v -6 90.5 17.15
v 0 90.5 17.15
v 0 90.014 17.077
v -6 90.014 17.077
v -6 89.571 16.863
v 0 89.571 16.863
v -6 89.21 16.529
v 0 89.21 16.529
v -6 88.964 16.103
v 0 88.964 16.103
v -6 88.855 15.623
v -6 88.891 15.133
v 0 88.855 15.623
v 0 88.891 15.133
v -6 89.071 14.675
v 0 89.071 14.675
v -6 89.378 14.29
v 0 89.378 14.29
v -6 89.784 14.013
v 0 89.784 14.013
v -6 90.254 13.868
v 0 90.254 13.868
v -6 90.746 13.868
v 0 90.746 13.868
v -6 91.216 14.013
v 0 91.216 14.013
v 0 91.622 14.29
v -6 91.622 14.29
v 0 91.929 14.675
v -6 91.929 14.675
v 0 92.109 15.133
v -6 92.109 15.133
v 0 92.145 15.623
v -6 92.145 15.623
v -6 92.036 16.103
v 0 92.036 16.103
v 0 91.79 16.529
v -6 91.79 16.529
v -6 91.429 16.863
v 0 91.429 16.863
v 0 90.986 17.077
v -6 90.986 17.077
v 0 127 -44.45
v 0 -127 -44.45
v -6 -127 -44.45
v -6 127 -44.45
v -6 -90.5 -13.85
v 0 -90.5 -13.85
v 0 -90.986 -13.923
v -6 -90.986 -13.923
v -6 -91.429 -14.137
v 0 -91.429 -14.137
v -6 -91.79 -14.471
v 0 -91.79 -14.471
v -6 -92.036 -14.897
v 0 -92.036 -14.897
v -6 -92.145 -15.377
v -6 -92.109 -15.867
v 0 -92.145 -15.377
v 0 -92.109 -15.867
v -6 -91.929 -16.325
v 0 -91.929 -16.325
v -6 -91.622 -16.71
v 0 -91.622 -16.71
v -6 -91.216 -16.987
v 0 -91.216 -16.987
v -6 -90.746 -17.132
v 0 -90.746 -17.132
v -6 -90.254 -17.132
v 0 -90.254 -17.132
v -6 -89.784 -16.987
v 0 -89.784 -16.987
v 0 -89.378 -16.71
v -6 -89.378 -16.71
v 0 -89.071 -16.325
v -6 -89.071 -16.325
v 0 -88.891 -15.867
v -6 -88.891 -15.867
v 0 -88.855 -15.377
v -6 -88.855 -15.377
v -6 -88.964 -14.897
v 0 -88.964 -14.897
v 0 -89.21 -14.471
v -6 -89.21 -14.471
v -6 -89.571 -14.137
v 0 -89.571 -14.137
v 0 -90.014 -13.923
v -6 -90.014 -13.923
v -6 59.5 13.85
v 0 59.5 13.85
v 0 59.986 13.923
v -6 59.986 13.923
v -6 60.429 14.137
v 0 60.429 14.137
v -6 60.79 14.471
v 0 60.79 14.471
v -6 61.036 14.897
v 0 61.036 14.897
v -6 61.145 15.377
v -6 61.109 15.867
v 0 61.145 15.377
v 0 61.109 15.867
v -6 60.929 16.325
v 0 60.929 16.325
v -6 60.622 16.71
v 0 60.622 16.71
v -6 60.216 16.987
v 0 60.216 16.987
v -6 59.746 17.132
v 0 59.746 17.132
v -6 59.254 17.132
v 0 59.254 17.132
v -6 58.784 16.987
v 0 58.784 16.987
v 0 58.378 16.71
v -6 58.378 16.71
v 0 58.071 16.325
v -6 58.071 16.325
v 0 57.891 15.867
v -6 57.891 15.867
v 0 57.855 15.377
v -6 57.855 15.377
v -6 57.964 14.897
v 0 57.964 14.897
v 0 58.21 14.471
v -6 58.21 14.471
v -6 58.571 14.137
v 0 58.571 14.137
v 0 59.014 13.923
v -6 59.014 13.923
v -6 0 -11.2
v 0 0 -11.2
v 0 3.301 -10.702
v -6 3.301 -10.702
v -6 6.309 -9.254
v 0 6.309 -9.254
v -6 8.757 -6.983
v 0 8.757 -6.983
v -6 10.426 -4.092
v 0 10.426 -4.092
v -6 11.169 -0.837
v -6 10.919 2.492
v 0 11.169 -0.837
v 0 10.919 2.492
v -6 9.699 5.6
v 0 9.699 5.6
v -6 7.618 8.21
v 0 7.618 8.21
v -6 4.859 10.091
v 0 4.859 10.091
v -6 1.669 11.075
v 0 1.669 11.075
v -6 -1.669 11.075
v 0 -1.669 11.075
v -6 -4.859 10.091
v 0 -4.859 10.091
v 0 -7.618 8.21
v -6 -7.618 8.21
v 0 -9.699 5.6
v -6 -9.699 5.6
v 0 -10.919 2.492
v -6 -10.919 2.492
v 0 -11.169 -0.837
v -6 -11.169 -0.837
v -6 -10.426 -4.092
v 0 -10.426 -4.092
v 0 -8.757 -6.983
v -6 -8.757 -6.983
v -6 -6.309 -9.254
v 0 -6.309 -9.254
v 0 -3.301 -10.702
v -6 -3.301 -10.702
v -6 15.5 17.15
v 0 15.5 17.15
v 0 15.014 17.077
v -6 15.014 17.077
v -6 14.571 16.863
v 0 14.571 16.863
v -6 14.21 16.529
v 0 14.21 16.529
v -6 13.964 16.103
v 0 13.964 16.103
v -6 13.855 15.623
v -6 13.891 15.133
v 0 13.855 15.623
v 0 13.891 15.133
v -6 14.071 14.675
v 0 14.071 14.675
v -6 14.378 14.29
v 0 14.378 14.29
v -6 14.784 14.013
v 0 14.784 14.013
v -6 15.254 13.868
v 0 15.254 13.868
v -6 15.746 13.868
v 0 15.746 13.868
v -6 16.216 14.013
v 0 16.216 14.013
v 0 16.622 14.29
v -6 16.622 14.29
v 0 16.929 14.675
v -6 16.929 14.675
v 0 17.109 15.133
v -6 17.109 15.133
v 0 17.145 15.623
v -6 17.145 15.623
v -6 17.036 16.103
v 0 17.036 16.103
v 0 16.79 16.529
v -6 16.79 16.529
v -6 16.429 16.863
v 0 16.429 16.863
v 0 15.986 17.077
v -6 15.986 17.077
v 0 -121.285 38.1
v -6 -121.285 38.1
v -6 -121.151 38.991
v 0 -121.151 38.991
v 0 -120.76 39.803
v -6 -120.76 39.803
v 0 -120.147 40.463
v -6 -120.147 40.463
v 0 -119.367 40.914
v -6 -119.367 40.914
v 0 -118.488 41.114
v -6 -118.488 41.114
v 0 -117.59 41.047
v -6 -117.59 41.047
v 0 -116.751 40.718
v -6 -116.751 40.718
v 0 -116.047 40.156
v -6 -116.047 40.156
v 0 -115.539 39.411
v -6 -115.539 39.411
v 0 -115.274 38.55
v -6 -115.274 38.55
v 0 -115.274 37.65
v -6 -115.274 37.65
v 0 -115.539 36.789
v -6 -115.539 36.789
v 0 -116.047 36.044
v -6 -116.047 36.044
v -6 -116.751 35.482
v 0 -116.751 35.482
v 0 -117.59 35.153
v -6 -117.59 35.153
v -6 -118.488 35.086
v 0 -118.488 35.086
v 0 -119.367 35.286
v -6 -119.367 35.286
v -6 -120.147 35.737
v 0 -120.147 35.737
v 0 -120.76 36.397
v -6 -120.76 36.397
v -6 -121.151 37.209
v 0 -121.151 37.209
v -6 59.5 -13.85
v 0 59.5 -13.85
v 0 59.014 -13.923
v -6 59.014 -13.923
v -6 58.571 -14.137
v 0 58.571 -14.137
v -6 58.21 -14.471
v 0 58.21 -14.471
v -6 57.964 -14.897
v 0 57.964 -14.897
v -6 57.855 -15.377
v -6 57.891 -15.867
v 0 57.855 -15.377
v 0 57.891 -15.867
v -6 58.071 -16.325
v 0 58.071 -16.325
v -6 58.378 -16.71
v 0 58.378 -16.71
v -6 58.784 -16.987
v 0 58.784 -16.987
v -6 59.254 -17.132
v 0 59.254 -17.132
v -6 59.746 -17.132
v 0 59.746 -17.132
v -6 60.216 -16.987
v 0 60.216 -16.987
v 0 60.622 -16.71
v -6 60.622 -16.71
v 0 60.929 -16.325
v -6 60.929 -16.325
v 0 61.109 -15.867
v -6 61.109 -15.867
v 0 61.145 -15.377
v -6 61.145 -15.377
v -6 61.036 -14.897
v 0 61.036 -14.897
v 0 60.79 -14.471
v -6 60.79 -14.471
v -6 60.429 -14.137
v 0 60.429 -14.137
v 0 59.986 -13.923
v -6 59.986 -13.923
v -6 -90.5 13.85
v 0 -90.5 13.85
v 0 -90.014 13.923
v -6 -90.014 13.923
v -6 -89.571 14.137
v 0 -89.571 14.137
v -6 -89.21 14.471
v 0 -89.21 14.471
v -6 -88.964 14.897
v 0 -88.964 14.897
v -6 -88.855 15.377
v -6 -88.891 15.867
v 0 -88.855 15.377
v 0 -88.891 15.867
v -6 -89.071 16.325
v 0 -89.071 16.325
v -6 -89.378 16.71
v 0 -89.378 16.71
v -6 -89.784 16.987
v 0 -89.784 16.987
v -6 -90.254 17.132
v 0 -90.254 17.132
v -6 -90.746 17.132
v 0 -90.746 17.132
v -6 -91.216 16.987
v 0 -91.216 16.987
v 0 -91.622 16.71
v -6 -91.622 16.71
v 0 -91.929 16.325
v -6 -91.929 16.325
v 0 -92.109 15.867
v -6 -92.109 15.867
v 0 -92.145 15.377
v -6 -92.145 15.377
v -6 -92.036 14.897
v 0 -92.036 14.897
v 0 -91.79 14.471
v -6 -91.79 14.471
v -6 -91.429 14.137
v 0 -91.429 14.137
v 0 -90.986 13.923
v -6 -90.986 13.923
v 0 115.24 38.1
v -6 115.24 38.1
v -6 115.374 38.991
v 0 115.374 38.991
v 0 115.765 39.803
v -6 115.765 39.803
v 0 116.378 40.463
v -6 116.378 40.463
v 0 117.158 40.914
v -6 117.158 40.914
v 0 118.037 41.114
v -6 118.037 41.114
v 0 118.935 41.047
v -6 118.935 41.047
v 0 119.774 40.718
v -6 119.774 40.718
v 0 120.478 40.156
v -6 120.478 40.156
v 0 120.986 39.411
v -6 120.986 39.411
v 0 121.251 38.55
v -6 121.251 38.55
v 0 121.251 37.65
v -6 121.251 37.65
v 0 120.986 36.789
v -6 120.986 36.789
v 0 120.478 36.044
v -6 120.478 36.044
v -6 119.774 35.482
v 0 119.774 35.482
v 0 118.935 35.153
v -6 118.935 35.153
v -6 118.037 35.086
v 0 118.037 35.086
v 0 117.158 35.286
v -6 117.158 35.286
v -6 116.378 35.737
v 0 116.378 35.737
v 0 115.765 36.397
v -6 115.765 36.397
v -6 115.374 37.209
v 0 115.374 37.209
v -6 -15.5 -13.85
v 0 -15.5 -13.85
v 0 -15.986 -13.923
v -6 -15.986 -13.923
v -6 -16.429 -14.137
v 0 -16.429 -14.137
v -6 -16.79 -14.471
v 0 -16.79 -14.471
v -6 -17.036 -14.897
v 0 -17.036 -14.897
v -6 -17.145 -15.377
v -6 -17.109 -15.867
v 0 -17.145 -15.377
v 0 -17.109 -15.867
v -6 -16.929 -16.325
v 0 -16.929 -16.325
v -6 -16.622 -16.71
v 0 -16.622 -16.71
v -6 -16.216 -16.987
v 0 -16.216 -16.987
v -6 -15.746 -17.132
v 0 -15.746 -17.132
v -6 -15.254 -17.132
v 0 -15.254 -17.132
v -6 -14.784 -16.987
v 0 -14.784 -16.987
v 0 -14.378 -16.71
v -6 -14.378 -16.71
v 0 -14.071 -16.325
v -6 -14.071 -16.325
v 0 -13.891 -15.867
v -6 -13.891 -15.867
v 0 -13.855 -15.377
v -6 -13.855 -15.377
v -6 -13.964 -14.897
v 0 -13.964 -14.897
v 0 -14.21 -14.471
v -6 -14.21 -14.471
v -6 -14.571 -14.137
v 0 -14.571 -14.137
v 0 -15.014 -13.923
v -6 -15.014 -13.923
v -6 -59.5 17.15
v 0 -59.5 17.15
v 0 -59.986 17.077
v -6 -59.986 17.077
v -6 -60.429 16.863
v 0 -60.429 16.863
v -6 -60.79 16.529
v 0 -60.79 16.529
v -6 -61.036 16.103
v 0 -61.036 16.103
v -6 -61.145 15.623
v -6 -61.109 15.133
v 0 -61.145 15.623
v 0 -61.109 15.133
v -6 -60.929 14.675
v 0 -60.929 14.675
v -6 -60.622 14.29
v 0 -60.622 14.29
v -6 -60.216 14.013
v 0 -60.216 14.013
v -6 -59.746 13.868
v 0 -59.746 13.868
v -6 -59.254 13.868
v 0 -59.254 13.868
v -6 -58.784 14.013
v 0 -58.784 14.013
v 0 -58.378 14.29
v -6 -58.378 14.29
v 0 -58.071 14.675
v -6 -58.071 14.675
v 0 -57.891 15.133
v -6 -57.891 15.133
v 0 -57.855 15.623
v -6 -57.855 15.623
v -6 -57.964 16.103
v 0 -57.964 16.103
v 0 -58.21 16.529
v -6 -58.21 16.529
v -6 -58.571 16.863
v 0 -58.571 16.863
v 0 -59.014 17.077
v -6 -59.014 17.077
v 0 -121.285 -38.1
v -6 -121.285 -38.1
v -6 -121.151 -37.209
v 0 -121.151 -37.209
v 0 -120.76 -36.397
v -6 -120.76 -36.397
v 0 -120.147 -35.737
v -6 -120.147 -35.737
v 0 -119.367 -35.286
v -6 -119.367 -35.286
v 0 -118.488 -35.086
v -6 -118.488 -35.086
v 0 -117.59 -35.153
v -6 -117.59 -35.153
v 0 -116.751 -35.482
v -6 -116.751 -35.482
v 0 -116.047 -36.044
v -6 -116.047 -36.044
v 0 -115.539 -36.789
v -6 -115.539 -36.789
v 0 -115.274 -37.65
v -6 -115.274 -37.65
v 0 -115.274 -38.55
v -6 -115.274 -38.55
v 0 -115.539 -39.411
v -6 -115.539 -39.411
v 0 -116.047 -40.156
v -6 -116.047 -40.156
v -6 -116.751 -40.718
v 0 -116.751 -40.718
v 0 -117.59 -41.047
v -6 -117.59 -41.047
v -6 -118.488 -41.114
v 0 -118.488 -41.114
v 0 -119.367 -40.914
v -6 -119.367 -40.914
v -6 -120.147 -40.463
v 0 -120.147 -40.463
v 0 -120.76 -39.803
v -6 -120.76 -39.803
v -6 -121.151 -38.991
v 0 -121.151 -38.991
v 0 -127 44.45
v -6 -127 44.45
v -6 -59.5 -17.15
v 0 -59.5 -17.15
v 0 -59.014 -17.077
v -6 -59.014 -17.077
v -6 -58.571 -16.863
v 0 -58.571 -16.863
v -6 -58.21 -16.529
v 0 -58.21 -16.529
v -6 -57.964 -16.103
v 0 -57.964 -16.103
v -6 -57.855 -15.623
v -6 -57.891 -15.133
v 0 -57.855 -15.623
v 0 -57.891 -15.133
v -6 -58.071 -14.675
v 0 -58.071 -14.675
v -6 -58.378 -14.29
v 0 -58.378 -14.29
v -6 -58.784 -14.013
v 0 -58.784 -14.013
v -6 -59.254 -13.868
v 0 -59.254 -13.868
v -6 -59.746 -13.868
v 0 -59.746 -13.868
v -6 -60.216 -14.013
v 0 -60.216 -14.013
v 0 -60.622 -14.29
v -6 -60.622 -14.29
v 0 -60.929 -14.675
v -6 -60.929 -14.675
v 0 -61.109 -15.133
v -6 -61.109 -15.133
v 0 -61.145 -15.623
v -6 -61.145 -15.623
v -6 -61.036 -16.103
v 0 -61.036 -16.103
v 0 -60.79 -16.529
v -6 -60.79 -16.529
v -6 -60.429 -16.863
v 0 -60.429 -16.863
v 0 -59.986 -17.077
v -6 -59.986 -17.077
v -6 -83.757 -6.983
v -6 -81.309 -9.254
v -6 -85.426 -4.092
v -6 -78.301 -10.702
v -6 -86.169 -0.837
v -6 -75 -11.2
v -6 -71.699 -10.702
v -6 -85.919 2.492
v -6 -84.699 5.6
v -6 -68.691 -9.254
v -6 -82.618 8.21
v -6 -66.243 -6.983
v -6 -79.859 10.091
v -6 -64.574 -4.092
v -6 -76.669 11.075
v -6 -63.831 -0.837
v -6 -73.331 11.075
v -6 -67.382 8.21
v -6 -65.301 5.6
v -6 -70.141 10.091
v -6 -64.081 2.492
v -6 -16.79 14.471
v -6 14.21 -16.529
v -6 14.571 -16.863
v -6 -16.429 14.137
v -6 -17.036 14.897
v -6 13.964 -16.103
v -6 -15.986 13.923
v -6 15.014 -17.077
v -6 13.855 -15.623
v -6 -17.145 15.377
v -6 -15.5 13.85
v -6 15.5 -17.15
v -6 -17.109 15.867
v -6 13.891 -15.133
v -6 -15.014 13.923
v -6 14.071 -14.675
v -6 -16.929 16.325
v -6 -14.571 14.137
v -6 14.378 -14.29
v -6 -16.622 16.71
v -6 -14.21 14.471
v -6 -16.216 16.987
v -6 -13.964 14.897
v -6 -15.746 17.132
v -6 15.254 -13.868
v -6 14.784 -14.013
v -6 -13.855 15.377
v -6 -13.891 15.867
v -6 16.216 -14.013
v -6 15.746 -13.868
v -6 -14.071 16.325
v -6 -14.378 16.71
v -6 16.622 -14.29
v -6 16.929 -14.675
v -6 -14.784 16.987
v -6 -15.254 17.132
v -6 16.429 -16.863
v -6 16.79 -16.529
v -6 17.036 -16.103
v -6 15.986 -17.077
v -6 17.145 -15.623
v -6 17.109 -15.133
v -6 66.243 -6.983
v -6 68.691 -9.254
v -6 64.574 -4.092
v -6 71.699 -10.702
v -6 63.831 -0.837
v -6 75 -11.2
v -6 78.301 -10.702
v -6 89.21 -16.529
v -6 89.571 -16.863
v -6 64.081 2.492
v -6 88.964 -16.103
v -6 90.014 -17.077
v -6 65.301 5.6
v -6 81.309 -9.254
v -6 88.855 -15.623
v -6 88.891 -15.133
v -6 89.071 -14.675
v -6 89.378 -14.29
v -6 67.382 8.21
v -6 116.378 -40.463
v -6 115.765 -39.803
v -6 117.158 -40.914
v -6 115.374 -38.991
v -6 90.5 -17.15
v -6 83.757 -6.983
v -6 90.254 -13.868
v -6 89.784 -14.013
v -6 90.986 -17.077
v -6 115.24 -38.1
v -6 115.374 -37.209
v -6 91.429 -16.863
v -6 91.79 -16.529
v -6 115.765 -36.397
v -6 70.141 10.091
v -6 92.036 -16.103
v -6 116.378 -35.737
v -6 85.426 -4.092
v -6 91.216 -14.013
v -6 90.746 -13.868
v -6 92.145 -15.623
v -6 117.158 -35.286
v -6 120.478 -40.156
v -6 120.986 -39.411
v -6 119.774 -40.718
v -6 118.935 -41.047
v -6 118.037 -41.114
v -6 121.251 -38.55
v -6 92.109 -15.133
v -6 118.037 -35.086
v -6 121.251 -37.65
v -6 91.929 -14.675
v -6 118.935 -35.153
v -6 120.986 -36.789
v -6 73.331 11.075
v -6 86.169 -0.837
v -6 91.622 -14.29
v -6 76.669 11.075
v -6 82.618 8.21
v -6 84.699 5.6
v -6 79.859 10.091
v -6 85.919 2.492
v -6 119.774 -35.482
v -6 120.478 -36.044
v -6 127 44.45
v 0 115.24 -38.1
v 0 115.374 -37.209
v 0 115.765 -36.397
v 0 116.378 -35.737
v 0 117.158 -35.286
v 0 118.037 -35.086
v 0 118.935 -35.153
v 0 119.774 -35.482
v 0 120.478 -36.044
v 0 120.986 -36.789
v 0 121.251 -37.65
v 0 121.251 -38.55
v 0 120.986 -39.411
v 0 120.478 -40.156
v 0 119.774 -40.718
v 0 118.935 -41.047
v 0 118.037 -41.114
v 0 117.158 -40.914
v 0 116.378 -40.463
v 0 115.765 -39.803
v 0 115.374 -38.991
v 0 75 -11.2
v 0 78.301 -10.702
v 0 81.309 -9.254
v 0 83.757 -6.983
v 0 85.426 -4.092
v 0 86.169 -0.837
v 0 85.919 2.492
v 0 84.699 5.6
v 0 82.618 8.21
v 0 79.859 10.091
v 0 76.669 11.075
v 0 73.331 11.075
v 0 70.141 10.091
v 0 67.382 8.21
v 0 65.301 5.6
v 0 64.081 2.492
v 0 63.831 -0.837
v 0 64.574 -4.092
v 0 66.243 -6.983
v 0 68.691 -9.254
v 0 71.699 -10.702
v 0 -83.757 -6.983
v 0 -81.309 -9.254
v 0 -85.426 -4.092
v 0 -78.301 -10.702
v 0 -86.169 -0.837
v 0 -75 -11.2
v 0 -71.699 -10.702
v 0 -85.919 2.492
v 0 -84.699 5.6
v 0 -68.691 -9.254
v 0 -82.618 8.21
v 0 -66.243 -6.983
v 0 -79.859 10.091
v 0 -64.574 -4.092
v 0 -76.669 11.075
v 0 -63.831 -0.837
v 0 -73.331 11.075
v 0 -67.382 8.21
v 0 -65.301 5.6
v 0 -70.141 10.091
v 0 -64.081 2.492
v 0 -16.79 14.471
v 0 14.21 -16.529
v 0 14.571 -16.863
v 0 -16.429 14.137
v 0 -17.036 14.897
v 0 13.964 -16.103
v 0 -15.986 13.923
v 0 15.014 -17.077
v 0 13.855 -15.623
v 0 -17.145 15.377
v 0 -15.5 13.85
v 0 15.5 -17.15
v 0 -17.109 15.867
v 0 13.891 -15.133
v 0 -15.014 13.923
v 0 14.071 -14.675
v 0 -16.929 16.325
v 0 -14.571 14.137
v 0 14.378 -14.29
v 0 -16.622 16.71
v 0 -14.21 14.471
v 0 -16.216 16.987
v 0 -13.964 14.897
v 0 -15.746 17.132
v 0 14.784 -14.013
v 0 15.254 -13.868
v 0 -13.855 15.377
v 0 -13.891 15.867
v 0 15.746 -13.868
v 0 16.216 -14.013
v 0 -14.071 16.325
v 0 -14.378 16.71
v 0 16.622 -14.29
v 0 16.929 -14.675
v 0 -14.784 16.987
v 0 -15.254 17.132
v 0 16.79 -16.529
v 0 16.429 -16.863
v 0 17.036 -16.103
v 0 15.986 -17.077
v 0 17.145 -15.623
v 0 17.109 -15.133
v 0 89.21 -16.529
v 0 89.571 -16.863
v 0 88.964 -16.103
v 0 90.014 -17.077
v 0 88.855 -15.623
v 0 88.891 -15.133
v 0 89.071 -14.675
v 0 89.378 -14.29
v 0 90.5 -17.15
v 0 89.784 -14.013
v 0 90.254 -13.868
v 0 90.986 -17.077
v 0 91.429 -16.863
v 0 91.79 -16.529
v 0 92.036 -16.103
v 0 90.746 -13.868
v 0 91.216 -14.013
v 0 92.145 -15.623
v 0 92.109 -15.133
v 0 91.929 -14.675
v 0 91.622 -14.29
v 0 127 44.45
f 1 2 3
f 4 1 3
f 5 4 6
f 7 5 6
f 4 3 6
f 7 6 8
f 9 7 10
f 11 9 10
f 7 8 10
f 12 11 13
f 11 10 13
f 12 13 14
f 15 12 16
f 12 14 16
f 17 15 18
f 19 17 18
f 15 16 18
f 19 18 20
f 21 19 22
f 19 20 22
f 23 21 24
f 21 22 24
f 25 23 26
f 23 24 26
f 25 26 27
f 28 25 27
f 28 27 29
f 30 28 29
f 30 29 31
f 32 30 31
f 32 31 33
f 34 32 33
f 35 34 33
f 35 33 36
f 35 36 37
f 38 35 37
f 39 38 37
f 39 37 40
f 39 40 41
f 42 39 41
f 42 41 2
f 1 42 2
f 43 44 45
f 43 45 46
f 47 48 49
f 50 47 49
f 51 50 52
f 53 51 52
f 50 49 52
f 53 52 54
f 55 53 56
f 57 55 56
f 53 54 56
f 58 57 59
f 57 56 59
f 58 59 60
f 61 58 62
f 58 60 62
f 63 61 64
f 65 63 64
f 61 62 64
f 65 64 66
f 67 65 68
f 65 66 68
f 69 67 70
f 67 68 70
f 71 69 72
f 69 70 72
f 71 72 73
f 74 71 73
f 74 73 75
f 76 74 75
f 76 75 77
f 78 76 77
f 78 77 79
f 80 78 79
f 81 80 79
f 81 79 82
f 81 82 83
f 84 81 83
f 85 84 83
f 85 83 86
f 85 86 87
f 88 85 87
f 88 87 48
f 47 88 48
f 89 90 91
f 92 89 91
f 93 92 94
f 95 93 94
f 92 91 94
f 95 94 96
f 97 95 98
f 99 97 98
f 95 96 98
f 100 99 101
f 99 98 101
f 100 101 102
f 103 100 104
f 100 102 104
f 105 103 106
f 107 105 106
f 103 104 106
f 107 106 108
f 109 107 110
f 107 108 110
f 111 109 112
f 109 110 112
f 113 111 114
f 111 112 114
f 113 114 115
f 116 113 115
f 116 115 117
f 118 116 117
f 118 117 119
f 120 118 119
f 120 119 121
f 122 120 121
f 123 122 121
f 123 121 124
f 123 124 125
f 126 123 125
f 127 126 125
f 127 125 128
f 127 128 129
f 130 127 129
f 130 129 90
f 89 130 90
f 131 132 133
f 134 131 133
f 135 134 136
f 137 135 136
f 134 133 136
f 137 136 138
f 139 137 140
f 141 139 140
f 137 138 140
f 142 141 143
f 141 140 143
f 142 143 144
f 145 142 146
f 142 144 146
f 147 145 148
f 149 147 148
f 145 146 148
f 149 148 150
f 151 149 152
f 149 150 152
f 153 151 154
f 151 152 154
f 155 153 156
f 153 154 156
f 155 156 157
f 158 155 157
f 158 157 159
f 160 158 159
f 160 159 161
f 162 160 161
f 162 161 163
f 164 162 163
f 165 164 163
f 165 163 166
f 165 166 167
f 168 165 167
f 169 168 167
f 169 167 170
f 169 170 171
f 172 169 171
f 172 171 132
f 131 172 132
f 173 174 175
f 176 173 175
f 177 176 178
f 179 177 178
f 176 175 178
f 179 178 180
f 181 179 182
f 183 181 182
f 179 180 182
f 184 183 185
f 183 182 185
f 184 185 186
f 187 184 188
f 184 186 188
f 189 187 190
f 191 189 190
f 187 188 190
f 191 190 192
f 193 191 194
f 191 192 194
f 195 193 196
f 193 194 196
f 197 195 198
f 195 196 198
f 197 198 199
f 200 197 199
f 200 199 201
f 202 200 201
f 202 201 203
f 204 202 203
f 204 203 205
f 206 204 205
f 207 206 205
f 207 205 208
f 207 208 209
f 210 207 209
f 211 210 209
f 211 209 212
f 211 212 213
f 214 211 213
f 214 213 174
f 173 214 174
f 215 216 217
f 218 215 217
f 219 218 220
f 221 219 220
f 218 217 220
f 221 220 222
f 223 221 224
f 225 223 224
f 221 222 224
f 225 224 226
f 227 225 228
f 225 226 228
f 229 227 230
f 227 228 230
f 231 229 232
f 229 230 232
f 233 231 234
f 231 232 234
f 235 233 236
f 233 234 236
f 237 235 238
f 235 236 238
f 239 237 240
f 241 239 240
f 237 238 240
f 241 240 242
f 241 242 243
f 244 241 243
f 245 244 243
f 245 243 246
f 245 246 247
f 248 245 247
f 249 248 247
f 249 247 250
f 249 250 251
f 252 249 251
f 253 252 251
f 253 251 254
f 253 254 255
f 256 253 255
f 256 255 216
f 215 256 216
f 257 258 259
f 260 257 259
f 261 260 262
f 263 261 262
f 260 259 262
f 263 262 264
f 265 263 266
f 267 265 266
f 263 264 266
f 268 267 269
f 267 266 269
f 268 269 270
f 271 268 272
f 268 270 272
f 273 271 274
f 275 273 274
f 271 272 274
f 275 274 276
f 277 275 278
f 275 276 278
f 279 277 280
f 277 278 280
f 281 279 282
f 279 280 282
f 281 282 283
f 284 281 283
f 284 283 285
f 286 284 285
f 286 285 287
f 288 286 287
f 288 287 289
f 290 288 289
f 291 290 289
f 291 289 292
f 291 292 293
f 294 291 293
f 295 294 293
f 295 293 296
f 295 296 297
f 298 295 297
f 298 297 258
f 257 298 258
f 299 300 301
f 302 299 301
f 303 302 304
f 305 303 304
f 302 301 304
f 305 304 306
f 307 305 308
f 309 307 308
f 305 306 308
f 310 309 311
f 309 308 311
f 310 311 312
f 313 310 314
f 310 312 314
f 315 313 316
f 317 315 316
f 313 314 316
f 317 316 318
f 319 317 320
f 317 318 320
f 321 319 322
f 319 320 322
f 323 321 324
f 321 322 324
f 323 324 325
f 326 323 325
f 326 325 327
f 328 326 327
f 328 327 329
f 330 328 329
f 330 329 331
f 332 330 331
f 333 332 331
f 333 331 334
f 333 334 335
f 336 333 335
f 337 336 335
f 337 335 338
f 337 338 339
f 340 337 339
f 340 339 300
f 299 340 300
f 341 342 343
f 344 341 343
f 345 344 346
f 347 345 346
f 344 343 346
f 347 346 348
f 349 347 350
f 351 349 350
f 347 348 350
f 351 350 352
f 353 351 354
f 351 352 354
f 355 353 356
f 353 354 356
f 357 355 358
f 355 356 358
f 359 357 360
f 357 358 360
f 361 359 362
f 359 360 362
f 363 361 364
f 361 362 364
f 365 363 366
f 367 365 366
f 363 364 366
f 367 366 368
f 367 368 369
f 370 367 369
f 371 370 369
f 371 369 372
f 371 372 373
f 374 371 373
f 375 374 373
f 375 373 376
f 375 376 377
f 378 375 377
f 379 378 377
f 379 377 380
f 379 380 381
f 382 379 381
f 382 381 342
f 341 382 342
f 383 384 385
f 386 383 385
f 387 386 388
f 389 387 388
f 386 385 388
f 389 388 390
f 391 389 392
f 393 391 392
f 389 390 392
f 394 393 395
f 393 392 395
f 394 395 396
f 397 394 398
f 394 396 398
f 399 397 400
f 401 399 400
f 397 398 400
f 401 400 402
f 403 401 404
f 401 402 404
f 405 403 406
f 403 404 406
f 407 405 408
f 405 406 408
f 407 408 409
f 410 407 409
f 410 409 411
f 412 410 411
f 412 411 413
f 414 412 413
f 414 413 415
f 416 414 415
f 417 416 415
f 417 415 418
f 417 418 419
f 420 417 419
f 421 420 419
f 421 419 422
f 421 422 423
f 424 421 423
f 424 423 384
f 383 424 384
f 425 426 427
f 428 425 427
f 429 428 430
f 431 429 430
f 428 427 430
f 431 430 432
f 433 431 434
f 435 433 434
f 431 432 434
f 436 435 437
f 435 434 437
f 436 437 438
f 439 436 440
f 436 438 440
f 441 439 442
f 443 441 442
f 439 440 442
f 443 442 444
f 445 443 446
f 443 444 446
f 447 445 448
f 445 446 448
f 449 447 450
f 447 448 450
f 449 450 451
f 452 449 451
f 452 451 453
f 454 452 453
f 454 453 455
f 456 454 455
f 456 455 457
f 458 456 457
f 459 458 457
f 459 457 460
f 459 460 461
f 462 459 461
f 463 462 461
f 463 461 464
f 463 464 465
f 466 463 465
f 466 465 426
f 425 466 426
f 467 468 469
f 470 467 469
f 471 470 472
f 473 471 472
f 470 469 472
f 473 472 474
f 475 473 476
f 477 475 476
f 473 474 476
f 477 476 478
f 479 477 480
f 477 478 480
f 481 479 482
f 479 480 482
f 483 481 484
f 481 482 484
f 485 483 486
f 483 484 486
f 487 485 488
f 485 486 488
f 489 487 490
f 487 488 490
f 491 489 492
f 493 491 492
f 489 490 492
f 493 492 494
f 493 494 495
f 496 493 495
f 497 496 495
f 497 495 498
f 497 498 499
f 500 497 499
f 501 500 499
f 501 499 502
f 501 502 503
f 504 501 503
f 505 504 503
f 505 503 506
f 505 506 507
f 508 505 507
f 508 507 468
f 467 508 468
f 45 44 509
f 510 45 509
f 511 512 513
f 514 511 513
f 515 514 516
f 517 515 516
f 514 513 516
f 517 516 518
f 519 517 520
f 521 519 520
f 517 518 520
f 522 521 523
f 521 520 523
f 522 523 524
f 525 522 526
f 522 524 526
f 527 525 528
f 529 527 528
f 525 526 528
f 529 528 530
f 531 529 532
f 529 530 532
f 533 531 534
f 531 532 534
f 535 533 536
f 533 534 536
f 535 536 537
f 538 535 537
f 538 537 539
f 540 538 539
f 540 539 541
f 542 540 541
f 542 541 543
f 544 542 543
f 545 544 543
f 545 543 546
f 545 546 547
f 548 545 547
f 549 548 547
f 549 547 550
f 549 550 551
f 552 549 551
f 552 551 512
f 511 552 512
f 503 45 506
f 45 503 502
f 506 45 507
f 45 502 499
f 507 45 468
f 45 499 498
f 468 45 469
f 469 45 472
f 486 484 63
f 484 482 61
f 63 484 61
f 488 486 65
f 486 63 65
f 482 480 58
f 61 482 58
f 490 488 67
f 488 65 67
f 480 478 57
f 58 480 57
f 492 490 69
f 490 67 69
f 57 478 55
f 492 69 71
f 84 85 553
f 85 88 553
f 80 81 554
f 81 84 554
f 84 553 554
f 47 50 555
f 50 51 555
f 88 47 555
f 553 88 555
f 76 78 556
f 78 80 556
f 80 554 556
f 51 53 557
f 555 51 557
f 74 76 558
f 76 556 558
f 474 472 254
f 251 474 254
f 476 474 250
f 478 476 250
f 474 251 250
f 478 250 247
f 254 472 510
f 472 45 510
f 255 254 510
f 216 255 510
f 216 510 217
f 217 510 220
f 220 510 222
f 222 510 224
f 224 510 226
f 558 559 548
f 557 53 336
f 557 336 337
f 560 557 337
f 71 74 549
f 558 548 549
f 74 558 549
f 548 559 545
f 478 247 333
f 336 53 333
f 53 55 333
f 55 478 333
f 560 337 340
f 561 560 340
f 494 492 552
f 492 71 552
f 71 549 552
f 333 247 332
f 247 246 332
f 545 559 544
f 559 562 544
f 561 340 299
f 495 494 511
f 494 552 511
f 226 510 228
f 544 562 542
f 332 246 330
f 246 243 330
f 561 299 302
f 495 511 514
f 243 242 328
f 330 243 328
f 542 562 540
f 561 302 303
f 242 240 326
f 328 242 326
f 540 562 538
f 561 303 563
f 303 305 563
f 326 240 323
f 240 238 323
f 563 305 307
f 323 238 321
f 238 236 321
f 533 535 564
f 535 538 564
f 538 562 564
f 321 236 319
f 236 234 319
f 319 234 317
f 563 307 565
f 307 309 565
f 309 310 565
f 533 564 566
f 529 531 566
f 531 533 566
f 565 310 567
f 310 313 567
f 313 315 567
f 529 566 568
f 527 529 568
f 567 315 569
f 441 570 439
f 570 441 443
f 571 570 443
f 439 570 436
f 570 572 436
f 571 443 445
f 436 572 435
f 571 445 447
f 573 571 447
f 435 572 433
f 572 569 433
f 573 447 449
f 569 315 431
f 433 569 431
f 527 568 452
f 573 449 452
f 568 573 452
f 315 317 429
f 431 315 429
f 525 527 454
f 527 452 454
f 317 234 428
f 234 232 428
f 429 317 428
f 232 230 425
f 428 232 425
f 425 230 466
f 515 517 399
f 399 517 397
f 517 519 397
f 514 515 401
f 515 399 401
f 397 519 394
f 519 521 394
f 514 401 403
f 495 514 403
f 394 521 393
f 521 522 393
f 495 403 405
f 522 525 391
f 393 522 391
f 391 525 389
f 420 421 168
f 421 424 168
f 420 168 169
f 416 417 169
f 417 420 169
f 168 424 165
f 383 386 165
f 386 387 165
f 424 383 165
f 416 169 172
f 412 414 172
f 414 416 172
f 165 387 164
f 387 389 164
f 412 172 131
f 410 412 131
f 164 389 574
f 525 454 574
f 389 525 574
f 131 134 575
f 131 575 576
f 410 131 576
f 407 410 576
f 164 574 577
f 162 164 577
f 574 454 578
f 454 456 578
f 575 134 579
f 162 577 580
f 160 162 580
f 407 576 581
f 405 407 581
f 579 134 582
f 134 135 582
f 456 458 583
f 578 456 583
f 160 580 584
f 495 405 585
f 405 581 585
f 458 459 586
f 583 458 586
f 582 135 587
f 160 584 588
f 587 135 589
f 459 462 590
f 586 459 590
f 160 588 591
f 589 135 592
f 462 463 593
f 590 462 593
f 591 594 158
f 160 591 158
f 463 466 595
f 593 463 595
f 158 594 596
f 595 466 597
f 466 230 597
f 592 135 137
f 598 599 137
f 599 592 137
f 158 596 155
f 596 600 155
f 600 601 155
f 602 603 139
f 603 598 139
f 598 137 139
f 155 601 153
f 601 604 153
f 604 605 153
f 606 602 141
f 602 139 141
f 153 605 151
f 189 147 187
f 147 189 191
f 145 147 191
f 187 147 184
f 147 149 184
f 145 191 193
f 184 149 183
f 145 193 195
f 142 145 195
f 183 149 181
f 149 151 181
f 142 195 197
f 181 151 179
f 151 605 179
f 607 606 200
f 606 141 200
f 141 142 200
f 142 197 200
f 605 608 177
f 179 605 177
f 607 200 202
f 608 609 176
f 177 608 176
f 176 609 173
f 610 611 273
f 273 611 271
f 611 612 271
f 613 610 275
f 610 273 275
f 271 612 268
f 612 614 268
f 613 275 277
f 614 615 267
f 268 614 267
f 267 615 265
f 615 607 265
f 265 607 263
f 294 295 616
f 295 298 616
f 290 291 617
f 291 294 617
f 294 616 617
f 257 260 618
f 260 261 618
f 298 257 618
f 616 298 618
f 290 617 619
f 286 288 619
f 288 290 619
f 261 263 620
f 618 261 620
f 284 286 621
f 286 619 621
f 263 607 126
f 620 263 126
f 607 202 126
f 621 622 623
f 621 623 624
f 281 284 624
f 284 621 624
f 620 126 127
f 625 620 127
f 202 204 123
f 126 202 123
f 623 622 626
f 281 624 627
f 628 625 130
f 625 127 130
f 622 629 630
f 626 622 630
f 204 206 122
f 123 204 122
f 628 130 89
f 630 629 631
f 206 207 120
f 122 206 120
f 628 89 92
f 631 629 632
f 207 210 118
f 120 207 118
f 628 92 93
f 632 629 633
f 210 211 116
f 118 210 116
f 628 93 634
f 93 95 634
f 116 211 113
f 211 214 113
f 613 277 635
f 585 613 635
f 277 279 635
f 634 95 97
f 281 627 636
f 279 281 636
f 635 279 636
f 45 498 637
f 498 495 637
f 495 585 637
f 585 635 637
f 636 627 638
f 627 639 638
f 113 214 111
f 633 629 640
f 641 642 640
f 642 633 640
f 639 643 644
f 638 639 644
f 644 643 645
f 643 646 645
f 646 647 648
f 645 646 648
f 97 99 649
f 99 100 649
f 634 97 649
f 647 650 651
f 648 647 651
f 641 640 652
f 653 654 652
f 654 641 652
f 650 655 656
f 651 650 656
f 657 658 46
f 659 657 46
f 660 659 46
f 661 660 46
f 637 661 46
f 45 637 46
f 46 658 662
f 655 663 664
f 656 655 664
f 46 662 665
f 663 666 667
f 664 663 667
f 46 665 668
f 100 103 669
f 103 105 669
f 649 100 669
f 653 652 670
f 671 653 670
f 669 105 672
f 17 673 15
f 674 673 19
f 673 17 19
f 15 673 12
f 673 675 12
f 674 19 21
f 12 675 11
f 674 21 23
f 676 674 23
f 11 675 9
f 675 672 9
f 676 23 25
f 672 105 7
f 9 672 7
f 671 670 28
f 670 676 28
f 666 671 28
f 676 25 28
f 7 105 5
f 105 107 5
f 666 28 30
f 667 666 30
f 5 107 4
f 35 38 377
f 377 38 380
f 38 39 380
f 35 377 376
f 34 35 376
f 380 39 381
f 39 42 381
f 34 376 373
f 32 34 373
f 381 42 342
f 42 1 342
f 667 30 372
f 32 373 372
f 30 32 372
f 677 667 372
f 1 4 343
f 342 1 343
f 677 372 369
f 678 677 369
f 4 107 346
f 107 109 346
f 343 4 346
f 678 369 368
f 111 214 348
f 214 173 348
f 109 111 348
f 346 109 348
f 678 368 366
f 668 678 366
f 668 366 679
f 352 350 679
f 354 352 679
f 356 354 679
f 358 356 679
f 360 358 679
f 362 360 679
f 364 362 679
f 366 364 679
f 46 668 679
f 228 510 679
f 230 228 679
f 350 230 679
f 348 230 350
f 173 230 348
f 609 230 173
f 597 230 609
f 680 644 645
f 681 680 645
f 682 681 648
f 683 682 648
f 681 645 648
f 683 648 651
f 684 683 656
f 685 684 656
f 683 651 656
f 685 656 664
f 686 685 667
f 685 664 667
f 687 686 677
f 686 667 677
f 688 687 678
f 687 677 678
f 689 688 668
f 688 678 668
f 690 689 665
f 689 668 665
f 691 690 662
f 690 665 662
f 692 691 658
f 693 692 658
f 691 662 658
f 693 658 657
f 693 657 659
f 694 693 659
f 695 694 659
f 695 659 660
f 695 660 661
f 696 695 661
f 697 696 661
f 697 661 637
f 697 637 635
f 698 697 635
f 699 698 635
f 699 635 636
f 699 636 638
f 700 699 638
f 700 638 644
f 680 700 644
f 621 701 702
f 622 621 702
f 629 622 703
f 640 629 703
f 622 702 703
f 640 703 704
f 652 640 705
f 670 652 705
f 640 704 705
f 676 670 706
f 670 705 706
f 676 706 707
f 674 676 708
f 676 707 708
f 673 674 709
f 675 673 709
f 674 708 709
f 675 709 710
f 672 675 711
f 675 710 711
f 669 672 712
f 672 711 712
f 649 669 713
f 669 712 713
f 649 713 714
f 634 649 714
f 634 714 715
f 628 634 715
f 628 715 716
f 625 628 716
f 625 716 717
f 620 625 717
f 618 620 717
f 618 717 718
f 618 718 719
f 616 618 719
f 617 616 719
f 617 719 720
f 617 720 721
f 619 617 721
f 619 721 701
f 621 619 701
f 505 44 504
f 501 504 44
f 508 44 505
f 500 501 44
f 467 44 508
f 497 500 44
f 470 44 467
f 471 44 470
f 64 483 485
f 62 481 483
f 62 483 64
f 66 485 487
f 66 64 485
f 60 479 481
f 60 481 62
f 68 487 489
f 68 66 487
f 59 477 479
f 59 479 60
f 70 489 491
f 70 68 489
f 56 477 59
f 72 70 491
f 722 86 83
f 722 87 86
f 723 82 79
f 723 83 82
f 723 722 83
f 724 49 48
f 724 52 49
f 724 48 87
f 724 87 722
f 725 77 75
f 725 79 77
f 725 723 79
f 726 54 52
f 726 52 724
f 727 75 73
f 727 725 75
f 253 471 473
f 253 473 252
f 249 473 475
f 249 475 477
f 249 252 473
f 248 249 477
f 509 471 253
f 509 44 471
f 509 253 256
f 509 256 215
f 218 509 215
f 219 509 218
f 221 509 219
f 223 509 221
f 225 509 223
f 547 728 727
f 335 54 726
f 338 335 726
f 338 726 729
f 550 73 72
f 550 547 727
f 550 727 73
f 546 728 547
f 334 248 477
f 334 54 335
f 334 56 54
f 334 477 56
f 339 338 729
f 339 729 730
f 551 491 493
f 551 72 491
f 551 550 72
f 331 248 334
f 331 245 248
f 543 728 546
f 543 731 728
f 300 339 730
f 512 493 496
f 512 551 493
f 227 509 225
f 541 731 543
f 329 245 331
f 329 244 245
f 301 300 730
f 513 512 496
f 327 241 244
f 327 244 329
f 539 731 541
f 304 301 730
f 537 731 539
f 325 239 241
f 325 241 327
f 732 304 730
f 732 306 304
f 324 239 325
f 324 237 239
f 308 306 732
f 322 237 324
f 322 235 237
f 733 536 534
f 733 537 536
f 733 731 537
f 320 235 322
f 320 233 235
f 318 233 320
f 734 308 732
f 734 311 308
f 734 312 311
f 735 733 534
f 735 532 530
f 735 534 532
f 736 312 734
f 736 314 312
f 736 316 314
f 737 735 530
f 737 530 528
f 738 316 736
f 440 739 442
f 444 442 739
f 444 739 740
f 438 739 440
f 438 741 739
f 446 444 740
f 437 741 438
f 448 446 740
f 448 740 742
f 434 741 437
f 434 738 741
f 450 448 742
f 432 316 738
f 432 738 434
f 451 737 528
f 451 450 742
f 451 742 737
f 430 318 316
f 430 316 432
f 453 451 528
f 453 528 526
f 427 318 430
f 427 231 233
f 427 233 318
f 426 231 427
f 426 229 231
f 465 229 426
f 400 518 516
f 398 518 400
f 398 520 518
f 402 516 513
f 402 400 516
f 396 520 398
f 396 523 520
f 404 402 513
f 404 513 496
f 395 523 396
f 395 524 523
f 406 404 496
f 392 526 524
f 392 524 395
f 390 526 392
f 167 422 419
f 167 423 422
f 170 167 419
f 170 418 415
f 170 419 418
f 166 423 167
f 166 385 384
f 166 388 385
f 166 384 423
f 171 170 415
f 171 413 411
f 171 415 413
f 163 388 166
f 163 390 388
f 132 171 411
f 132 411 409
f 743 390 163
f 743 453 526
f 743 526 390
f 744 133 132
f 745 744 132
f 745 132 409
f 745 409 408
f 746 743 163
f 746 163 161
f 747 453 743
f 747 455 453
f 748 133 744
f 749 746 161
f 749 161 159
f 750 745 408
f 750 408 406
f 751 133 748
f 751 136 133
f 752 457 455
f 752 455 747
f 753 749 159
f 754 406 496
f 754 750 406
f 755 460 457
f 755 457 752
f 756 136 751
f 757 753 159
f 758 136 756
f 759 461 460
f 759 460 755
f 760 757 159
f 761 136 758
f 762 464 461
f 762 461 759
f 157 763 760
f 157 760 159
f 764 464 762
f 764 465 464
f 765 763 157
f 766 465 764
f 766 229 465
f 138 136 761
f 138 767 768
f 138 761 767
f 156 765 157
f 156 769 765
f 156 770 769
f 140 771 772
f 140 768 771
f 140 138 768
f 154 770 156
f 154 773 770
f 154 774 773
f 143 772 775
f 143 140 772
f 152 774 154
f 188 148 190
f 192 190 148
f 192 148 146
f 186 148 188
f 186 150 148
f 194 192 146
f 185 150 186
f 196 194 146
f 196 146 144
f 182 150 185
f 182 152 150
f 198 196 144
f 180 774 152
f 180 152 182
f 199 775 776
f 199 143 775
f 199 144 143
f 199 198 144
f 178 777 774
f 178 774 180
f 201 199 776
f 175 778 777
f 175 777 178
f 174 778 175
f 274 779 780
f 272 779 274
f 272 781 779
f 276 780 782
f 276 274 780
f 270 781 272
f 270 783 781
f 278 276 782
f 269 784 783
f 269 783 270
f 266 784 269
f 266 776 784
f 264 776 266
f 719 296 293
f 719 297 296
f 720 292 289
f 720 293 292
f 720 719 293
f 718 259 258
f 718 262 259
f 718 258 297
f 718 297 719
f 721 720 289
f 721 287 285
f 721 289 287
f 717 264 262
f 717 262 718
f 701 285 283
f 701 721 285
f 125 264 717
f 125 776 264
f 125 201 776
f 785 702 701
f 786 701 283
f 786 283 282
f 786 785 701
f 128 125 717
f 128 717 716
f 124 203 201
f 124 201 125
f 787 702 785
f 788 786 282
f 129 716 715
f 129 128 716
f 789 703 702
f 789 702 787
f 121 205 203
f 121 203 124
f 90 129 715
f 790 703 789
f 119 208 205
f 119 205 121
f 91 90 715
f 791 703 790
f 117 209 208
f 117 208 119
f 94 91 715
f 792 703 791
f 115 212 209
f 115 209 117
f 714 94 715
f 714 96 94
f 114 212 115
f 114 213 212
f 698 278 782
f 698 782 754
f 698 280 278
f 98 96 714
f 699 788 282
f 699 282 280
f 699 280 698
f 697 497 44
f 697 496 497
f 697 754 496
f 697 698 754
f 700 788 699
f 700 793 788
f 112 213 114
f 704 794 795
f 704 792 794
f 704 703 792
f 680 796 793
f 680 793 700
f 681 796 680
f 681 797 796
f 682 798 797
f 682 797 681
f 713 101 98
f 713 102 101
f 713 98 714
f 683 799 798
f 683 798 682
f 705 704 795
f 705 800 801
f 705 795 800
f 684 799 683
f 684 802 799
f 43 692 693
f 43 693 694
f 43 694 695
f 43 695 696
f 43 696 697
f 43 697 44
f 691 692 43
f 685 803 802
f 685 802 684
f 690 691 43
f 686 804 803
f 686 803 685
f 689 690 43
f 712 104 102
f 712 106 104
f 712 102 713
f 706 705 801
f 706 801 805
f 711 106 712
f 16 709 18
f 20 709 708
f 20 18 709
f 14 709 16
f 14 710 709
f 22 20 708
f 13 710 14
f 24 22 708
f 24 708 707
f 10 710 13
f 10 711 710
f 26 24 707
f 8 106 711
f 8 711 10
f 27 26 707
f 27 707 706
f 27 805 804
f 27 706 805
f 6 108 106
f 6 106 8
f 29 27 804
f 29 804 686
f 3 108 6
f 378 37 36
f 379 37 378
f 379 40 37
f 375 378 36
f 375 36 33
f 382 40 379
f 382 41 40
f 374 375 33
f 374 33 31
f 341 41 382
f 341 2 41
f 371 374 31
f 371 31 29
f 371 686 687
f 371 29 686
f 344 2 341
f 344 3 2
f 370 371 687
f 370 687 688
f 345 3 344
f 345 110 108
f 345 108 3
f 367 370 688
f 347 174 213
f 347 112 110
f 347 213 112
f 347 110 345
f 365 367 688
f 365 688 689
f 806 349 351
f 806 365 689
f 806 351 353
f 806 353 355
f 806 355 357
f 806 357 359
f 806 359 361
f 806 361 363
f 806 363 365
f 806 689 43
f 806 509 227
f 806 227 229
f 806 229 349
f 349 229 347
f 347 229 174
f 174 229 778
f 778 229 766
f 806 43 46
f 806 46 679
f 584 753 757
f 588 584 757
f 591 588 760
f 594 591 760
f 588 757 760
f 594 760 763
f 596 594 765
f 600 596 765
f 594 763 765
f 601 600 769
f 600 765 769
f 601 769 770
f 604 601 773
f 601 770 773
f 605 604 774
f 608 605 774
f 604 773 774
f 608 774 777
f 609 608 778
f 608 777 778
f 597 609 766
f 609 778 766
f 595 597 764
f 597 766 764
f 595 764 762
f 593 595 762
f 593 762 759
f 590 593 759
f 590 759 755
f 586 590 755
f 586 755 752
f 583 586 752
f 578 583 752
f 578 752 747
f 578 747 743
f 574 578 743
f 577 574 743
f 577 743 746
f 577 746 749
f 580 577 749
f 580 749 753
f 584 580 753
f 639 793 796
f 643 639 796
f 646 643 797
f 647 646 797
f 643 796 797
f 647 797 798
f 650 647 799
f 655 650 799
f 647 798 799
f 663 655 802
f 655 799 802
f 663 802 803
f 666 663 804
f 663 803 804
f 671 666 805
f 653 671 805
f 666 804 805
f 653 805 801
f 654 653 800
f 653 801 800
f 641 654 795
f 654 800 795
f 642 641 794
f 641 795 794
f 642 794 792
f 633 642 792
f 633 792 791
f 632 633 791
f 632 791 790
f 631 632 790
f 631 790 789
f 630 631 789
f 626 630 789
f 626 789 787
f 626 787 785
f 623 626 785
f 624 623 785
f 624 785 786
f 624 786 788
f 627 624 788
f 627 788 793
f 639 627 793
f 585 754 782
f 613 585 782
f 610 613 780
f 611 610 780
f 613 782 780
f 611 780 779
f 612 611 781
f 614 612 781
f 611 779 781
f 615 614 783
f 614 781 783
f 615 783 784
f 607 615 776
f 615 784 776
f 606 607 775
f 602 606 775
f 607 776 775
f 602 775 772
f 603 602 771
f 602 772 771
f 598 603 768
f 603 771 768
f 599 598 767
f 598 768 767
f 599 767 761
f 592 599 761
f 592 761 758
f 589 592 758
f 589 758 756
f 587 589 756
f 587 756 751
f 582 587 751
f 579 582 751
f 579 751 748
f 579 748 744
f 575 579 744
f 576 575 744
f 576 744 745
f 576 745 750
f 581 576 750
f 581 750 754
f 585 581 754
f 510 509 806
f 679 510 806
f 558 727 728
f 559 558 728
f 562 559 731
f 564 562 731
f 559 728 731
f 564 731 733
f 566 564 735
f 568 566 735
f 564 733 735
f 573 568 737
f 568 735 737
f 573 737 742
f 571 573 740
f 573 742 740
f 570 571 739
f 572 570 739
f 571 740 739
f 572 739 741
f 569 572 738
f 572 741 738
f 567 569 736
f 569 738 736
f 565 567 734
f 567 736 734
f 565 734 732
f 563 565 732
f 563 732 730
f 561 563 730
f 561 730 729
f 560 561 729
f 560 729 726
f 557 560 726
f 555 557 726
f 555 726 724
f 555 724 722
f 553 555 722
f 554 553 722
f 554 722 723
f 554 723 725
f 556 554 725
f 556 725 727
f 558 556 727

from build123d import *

# Parameters (mm, degrees)
SKETCH1_W              = 254
SKETCH1_H              = 88.9
BOSS_EXTRUDE1_DEPTH    = 6
F_10_CLEARANCE_HOLE1_D = 6.0452
SKETCH4_R              = 11.2
SKETCH4_R_2            = 1.65
CUT_EXTRUDE1_DEPTH     = 135.687796403


with BuildPart() as part:
    # Sketch1 → Boss-Extrude1 (new body)
    with BuildSketch(Plane.YZ):
        Rectangle(SKETCH1_W, SKETCH1_H)
    extrude(amount=-BOSS_EXTRUDE1_DEPTH)

    # #10 Clearance Hole1 (through all)
    with Locations(Plane.YZ):
        with Locations((118.2625, 38.1), (-118.2625, 38.1), (-118.2625, -38.1), (118.2625, -38.1)):
            Hole(F_10_CLEARANCE_HOLE1_D / 2)

    # Sketch4 → Cut-Extrude1 (cut, through all)
    with BuildSketch(Plane.YZ):
        with Locations(Location((0, 0, 0), (0, 0, 270))):
            Circle(SKETCH4_R)
        with Locations(Location((-15.5, 15.5, 0), (0, 0, 270))):
            Circle(SKETCH4_R_2)
        with Locations(Location((15.5, 15.5, 0), (0, 0, 90))):
            Circle(SKETCH4_R_2)
        with Locations(Location((15.5, -15.5, 0), (0, 0, 270))):
            Circle(SKETCH4_R_2)
        with Locations(Location((-15.5, -15.5, 0), (0, 0, 90))):
            Circle(SKETCH4_R_2)
        with Locations(Location((75, 0, 0), (0, 0, 270))):
            Circle(SKETCH4_R)
        with Locations(Location((59.5, 15.5, 0), (0, 0, 270))):
            Circle(SKETCH4_R_2)
        with Locations(Location((90.5, 15.5, 0), (0, 0, 90))):
            Circle(SKETCH4_R_2)
        with Locations(Location((90.5, -15.5, 0), (0, 0, 270))):
            Circle(SKETCH4_R_2)
        with Locations(Location((59.5, -15.5, 0), (0, 0, 90))):
            Circle(SKETCH4_R_2)
        with Locations(Location((-75, 0, 0), (0, 0, 270))):
            Circle(SKETCH4_R)
        with Locations(Location((-90.5, -15.5, 0), (0, 0, 90))):
            Circle(SKETCH4_R_2)
        with Locations(Location((-59.5, -15.5, 0), (0, 0, 270))):
            Circle(SKETCH4_R_2)
        with Locations(Location((-59.5, 15.5, 0), (0, 0, 90))):
            Circle(SKETCH4_R_2)
        with Locations(Location((-90.5, 15.5, 0), (0, 0, 270))):
            Circle(SKETCH4_R_2)
    extrude(amount=-CUT_EXTRUDE1_DEPTH, mode=Mode.SUBTRACT)


solid = part.part
